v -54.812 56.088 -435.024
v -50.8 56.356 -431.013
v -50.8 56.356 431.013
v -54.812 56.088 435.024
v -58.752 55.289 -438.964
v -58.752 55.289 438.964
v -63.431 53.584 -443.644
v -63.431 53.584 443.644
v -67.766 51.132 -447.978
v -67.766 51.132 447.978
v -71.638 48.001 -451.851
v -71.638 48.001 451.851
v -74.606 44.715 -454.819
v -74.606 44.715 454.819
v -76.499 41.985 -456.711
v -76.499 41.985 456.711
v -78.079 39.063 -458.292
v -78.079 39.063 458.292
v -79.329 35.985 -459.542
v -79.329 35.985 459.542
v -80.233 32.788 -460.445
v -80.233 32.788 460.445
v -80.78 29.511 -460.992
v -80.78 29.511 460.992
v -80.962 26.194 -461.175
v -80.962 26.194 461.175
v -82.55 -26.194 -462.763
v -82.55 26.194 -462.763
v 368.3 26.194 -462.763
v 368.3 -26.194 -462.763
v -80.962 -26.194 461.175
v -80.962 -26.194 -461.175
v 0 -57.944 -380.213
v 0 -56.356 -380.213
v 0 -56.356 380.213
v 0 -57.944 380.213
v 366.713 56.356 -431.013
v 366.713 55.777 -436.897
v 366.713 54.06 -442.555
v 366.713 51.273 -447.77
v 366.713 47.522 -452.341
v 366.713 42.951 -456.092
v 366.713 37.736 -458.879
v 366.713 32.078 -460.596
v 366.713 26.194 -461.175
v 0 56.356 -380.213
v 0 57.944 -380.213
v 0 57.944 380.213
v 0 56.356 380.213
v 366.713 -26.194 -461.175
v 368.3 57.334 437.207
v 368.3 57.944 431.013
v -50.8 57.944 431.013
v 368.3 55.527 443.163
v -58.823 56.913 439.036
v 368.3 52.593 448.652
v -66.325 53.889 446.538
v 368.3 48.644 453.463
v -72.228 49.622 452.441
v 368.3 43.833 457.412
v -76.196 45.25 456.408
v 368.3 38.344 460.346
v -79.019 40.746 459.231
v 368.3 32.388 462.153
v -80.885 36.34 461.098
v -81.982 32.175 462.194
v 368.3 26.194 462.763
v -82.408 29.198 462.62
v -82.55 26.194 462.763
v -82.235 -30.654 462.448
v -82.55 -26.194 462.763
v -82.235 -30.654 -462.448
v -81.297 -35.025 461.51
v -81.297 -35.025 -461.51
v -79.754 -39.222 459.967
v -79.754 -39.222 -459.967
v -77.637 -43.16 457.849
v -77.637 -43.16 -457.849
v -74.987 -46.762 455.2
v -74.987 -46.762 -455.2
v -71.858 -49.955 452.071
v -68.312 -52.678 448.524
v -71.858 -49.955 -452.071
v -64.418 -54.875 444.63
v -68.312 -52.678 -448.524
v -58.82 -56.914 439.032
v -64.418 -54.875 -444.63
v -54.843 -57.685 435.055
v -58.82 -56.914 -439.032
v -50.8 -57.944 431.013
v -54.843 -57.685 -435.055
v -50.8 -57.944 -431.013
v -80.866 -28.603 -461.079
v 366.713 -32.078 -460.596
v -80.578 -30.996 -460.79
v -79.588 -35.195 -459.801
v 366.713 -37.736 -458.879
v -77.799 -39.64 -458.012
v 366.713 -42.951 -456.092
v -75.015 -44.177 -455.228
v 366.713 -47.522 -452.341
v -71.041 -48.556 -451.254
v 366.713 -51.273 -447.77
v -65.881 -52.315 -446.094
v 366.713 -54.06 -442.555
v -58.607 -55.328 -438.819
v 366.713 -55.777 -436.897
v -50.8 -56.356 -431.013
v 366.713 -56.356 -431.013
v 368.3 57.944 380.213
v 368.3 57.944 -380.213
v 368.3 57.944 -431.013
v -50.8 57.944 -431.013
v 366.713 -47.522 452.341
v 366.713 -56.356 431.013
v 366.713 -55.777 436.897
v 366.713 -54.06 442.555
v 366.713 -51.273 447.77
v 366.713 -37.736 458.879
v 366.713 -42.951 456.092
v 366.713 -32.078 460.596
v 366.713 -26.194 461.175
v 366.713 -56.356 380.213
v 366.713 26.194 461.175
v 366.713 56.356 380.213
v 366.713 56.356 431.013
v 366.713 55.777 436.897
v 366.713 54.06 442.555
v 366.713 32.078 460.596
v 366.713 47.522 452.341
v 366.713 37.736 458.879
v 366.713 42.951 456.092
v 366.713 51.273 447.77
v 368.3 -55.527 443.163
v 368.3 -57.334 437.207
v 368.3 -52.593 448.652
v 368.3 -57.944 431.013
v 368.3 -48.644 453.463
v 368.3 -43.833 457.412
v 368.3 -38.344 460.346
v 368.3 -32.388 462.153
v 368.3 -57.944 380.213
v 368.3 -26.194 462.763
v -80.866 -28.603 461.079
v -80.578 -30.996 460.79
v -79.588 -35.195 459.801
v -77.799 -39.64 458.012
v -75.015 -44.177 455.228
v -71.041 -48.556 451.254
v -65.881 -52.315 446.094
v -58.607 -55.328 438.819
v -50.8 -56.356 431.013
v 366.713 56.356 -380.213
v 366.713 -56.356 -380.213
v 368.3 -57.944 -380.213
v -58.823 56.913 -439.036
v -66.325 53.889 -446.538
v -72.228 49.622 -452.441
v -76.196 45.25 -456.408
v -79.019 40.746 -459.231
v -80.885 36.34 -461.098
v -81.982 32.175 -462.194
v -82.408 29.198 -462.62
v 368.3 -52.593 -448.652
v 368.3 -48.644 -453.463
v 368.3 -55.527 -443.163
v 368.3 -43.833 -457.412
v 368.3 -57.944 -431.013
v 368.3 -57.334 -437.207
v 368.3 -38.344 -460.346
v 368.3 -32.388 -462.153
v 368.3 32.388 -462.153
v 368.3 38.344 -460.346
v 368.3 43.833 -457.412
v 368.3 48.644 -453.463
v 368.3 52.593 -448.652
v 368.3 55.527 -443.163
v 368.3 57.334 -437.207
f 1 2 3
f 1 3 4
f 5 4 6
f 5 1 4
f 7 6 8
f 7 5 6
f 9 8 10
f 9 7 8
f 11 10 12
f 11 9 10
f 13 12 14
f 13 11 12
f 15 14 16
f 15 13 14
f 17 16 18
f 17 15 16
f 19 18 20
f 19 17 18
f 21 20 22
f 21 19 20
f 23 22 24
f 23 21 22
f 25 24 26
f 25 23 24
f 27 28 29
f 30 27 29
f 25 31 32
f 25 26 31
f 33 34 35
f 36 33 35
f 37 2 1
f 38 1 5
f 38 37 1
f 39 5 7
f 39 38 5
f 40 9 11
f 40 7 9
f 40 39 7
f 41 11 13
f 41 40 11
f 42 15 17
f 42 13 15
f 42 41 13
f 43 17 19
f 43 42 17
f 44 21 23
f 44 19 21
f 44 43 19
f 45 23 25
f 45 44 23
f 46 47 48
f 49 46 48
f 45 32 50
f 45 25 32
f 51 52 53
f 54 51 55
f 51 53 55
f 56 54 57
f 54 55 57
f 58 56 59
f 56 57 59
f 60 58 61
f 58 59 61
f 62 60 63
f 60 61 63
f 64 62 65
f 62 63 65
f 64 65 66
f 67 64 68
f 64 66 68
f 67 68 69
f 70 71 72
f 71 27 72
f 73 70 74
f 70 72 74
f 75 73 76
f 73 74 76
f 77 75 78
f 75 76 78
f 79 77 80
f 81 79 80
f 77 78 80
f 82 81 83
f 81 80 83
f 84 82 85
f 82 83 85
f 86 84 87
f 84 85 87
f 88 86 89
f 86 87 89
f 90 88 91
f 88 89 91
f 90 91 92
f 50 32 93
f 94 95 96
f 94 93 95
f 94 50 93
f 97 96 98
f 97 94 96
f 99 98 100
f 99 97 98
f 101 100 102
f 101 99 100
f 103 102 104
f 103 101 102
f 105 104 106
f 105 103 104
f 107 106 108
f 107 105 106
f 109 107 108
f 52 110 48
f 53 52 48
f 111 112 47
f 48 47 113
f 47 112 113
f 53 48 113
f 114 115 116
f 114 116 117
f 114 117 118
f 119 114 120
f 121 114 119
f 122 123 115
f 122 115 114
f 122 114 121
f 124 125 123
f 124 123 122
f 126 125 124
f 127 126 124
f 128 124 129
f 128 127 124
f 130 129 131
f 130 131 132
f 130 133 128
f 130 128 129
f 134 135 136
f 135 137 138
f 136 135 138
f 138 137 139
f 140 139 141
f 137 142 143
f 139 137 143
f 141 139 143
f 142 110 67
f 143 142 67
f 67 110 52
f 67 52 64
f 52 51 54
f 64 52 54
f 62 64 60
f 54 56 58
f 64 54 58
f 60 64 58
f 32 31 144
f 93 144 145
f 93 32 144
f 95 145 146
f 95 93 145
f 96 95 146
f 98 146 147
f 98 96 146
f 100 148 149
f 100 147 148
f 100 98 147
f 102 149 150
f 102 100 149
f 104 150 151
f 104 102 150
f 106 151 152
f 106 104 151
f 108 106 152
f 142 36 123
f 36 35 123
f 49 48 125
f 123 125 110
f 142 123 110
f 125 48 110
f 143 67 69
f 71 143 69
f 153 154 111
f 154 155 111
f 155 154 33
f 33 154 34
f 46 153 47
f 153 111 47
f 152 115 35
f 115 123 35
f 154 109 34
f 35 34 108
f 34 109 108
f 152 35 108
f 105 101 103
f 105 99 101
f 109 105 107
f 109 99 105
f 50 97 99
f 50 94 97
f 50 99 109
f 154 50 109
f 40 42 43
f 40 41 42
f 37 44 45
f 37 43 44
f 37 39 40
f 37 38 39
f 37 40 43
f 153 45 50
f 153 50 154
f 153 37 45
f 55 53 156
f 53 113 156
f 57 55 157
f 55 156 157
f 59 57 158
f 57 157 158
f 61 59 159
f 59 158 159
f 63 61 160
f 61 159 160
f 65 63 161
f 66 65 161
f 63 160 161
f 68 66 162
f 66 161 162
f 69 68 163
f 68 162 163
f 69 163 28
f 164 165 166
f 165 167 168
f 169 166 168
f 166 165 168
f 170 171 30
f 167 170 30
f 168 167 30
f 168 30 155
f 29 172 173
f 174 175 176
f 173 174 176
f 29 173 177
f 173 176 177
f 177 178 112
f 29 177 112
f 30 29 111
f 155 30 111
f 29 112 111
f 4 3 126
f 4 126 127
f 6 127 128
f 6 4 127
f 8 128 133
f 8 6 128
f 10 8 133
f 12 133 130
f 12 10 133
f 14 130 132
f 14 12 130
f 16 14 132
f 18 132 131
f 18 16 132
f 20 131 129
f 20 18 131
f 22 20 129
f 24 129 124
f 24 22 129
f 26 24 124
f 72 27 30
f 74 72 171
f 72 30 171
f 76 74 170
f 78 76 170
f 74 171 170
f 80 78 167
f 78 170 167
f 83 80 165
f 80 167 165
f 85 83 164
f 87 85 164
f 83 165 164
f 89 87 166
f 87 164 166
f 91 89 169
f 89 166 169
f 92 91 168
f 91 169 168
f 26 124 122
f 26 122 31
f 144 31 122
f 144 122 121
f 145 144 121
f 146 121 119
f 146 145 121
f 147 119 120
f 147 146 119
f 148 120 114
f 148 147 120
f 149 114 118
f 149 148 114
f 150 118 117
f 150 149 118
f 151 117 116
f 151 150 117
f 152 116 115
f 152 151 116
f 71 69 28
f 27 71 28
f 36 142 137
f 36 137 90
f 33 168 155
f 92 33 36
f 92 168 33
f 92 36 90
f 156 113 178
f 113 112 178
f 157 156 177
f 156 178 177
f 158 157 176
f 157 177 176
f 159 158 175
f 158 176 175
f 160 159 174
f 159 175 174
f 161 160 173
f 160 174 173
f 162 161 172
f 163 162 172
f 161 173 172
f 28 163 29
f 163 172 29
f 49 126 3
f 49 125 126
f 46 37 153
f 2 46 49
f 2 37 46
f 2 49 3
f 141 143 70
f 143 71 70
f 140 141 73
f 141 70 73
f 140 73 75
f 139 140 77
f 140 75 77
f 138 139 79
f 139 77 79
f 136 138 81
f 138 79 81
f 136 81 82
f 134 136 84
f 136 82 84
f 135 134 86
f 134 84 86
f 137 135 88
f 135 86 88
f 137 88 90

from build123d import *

# Parameters (mm, degrees)
BOSS_EXTRUDE1_DEPTH = 57.94375
FILLET1_R           = 31.75
SHELL1_T            = -1.5875


with BuildPart() as part:
    # Sketch1 → Boss-Extrude1 (new body, symmetric)
    with BuildSketch(Plane(origin=(0, 0, 0), x_dir=(1, 0, 0), z_dir=(0, 1, 0))):
        Polygon((368.3, 380.2126), (0, 380.2126), (0, -380.2126), (368.3, -380.2126), (368.3, -462.7626), (-82.55, -462.7626), (-82.55, 462.7626), (368.3, 462.7626), align=None)
    extrude(amount=BOSS_EXTRUDE1_DEPTH, both=True)

    # Fillet1
    fillet1_edges = [part.edges().sort_by_distance(p)[0] for p in [
        (142.875, -57.94375, 462.7626),
        (-82.55, -57.94375, 0),
        (142.875, -57.94375, -462.7626),
        (-82.55, 57.94375, 0),
        (142.875, 57.94375, 462.7626),
        (142.875, 57.94375, -462.7626),
    ]]
    fillet(fillet1_edges, radius=FILLET1_R)

    # Shell1
    shell1_openings = [part.faces().sort_by_distance(p)[0] for p in [
        (184.15, 0, -380.2126),
        (0, 0, 0),
        (184.15, 0, 380.2126),
    ]]
    offset(amount=SHELL1_T, openings=shell1_openings)


solid = part.part
